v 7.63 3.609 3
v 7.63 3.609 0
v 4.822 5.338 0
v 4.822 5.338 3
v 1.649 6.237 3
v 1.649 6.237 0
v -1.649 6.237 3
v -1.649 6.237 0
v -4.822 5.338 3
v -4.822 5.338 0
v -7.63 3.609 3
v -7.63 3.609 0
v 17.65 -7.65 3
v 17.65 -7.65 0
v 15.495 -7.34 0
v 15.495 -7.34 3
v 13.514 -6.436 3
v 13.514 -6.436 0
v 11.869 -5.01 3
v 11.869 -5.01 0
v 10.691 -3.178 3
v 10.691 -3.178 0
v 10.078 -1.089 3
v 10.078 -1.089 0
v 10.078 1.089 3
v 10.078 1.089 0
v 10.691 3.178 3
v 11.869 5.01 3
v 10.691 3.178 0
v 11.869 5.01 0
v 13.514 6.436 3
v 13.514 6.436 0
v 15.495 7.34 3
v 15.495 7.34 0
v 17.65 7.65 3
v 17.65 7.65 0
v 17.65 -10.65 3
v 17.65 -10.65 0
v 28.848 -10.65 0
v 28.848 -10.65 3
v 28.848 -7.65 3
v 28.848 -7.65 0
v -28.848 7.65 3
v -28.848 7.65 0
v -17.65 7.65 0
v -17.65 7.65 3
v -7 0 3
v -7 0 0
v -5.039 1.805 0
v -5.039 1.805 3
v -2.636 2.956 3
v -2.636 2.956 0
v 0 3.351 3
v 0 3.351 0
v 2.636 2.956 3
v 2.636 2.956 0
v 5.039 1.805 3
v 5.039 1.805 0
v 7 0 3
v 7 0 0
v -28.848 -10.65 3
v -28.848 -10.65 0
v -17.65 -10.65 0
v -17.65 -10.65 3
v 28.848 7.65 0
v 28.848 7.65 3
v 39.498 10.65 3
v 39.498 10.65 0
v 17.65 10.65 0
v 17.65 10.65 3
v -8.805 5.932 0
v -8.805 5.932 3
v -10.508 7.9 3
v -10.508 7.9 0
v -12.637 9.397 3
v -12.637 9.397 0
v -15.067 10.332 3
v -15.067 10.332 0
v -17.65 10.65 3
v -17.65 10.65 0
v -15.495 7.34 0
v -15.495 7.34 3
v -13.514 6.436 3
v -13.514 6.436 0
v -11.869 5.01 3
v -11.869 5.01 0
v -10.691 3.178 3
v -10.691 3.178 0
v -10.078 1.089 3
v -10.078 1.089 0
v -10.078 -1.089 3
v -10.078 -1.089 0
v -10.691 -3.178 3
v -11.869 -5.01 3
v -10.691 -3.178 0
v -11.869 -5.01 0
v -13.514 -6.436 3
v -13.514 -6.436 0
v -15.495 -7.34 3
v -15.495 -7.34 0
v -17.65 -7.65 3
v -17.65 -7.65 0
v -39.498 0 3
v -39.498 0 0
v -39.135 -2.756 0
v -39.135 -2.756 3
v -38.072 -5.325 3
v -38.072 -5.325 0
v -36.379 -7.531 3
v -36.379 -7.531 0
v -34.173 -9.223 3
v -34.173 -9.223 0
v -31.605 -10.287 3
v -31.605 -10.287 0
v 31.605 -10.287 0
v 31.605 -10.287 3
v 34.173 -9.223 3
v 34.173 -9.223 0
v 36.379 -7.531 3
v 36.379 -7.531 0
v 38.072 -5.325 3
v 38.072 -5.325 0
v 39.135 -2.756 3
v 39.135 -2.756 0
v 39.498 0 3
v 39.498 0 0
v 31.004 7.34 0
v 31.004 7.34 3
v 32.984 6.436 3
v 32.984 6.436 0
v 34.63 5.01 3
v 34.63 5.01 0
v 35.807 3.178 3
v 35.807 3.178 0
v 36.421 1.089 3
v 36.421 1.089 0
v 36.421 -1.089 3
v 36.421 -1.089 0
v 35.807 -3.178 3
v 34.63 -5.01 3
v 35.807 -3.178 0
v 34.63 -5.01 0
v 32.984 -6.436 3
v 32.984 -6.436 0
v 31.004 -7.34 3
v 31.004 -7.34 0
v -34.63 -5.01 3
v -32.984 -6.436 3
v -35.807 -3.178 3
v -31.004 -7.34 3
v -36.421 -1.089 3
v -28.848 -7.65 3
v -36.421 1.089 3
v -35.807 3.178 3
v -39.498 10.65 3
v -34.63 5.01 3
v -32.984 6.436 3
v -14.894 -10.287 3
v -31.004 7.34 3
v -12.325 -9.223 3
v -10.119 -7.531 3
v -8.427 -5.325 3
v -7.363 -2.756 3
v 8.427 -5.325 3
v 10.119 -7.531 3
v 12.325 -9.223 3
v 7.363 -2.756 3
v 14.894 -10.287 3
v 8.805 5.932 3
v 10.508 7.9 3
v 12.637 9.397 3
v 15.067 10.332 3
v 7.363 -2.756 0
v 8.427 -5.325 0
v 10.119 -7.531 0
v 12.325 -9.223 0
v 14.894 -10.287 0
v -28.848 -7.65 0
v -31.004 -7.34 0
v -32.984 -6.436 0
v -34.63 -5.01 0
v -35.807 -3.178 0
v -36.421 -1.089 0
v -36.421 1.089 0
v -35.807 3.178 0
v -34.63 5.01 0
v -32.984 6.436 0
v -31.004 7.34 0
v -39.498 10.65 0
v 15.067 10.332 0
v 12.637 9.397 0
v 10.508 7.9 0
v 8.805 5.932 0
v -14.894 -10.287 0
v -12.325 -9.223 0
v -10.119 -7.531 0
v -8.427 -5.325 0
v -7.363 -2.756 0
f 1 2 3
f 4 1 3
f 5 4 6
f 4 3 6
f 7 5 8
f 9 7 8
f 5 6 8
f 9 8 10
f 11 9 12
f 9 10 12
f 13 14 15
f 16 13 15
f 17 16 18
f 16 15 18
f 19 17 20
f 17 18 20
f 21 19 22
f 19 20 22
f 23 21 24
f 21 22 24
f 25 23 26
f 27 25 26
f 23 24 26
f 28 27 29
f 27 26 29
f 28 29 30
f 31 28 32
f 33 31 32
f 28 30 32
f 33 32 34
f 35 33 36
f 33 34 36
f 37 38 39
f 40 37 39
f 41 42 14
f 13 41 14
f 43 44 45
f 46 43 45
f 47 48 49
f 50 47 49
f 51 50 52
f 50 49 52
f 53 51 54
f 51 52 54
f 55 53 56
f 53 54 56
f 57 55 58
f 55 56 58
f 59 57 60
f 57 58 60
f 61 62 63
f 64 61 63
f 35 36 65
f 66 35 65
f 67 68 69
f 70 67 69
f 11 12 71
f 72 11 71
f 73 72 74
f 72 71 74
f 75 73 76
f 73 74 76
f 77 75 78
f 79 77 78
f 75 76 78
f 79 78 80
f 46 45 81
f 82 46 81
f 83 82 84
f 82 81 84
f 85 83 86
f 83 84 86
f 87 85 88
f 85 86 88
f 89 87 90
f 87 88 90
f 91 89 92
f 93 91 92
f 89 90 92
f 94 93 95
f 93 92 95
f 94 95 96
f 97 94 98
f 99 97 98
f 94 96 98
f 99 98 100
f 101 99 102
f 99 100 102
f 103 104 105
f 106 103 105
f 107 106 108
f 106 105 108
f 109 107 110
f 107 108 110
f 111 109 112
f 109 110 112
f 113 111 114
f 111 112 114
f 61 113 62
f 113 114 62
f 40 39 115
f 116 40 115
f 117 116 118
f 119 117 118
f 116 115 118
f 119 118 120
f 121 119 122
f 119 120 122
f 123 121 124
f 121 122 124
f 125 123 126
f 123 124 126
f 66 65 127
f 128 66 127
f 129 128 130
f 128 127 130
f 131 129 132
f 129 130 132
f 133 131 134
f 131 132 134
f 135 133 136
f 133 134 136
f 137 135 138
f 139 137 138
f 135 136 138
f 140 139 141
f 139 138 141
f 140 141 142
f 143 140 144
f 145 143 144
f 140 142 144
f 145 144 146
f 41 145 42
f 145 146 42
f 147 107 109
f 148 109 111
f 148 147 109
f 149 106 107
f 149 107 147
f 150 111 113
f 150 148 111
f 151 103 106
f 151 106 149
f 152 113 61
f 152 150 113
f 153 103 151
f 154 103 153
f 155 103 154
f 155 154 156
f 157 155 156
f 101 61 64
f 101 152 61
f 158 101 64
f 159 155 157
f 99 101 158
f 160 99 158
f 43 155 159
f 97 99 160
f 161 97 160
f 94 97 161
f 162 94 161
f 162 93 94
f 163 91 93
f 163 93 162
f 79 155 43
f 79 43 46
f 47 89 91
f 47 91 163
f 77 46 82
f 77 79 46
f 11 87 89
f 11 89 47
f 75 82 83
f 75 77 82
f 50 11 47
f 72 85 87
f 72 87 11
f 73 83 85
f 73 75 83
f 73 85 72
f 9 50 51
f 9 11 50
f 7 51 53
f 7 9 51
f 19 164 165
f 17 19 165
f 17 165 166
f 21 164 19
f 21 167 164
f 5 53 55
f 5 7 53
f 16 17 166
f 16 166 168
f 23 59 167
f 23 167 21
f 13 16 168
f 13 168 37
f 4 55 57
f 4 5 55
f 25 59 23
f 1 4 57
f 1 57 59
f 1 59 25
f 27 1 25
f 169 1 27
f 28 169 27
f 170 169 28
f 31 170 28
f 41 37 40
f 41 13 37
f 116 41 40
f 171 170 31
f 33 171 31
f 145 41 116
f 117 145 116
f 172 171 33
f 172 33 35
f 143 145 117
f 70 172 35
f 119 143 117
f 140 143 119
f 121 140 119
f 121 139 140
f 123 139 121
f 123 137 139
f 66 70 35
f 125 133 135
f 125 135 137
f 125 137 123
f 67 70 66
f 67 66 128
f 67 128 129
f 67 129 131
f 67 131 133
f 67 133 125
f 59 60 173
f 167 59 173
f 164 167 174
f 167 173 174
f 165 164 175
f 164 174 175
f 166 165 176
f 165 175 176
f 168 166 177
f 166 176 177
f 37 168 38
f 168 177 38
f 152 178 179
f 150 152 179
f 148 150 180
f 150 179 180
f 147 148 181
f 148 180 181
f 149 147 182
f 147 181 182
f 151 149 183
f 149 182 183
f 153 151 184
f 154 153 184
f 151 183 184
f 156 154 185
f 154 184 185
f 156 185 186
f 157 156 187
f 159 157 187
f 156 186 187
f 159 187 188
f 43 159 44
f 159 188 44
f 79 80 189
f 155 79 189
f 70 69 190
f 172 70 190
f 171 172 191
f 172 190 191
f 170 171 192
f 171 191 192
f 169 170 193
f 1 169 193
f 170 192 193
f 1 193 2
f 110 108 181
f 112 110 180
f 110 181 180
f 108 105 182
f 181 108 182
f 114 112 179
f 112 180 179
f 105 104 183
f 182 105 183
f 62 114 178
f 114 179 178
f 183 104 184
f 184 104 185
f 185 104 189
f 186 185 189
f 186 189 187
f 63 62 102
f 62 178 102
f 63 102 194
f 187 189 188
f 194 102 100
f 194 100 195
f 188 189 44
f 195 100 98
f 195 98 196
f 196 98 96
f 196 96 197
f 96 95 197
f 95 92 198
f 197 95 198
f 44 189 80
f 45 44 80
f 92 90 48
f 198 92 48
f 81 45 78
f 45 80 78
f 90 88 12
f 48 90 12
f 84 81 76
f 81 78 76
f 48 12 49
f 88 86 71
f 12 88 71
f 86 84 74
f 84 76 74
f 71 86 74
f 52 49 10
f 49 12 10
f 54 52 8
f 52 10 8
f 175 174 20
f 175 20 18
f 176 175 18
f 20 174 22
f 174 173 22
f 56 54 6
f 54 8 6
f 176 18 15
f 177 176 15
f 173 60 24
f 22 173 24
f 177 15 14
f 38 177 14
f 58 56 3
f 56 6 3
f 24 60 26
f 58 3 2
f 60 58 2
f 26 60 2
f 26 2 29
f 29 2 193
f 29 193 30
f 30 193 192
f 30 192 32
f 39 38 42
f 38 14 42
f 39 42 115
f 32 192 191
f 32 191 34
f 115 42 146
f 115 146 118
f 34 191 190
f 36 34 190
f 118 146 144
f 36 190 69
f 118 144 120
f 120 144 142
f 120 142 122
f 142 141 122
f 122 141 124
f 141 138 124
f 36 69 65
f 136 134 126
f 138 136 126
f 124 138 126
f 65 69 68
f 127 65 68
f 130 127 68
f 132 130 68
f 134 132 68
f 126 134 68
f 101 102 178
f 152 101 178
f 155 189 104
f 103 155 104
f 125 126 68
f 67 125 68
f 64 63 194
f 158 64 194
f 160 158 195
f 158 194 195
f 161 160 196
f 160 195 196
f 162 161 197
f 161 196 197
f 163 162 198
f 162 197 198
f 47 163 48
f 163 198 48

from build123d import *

# Parameters (mm, degrees)
F1_DEPTH = 3


with BuildPart() as f1:
    # F0 (on Top) → F1 (new body)
    with BuildSketch(Plane.XY):
        with BuildLine():
            ThreePointArc((-39.498382, 0), (-36.379069, 7.530687), (-28.848382, 10.65))
            Line((-28.848382, 10.65), (-39.498382, 10.65))
            Line((-39.498382, 10.65), (-39.498382, 0))
        make_face()
        with BuildLine():
            Line((-17.65, 10.65), (-28.848382, 10.65))
            ThreePointArc((-28.848382, 10.65), (-36.379069, 7.530687), (-39.498382, 0))
            ThreePointArc((-39.498382, 0), (-36.379069, -7.530687), (-28.848382, -10.65))
            Line((-28.848382, -10.65), (-17.65, -10.65))
            ThreePointArc((-17.65, -10.65), (-10.119313, -7.530687), (-7, 0))
            ThreePointArc((-7, 0), (-7.158698, 1.831689), (-7.630063, 3.608788))
            ThreePointArc((-7.630063, 3.608788), (-11.526729, 8.71367), (-17.65, 10.65))
        make_face()
        with BuildLine():
            ThreePointArc((-17.65, 7.65), (-10, 0), (-17.65, -7.65))
            Line((-17.65, -7.65), (-28.848382, -7.65))
            ThreePointArc((-28.848382, -7.65), (-36.498382, 0), (-28.848382, 7.65))
            Line((-28.848382, 7.65), (-17.65, 7.65))
        make_face(mode=Mode.SUBTRACT)
        with BuildLine():
            ThreePointArc((7.630063, 3.608788), (0, 6.350694), (-7.630063, 3.608788))
            ThreePointArc((-7.630063, 3.608788), (-7.158698, 1.831689), (-7, 0))
            ThreePointArc((-7, 0), (0, 3.350694), (7, 0))
            ThreePointArc((7, 0), (7.158698, 1.831689), (7.630063, 3.608788))
        make_face()
        with BuildLine():
            ThreePointArc((17.65, 10.65), (11.526729, 8.71367), (7.630063, 3.608788))
            ThreePointArc((7.630063, 3.608788), (7.158698, 1.831689), (7, 0))
            ThreePointArc((7, 0), (10.119313, -7.530687), (17.65, -10.65))
            Line((17.65, -10.65), (28.848382, -10.65))
            ThreePointArc((28.848382, -10.65), (36.379069, -7.530687), (39.498382, 0))
            ThreePointArc((39.498382, 0), (36.379069, 7.530687), (28.848382, 10.65))
            Line((28.848382, 10.65), (17.65, 10.65))
        make_face()
        with BuildLine():
            Line((28.848382, -7.65), (17.65, -7.65))
            ThreePointArc((17.65, -7.65), (10, 0), (17.65, 7.65))
            Line((17.65, 7.65), (28.848382, 7.65))
            ThreePointArc((28.848382, 7.65), (36.498382, 0), (28.848382, -7.65))
        make_face(mode=Mode.SUBTRACT)
        with BuildLine():
            Line((39.498382, 10.65), (28.848382, 10.65))
            ThreePointArc((28.848382, 10.65), (36.379069, 7.530687), (39.498382, 0))
            Line((39.498382, 0), (39.498382, 10.65))
        make_face()
    extrude(amount=F1_DEPTH)


solid = f1.part
